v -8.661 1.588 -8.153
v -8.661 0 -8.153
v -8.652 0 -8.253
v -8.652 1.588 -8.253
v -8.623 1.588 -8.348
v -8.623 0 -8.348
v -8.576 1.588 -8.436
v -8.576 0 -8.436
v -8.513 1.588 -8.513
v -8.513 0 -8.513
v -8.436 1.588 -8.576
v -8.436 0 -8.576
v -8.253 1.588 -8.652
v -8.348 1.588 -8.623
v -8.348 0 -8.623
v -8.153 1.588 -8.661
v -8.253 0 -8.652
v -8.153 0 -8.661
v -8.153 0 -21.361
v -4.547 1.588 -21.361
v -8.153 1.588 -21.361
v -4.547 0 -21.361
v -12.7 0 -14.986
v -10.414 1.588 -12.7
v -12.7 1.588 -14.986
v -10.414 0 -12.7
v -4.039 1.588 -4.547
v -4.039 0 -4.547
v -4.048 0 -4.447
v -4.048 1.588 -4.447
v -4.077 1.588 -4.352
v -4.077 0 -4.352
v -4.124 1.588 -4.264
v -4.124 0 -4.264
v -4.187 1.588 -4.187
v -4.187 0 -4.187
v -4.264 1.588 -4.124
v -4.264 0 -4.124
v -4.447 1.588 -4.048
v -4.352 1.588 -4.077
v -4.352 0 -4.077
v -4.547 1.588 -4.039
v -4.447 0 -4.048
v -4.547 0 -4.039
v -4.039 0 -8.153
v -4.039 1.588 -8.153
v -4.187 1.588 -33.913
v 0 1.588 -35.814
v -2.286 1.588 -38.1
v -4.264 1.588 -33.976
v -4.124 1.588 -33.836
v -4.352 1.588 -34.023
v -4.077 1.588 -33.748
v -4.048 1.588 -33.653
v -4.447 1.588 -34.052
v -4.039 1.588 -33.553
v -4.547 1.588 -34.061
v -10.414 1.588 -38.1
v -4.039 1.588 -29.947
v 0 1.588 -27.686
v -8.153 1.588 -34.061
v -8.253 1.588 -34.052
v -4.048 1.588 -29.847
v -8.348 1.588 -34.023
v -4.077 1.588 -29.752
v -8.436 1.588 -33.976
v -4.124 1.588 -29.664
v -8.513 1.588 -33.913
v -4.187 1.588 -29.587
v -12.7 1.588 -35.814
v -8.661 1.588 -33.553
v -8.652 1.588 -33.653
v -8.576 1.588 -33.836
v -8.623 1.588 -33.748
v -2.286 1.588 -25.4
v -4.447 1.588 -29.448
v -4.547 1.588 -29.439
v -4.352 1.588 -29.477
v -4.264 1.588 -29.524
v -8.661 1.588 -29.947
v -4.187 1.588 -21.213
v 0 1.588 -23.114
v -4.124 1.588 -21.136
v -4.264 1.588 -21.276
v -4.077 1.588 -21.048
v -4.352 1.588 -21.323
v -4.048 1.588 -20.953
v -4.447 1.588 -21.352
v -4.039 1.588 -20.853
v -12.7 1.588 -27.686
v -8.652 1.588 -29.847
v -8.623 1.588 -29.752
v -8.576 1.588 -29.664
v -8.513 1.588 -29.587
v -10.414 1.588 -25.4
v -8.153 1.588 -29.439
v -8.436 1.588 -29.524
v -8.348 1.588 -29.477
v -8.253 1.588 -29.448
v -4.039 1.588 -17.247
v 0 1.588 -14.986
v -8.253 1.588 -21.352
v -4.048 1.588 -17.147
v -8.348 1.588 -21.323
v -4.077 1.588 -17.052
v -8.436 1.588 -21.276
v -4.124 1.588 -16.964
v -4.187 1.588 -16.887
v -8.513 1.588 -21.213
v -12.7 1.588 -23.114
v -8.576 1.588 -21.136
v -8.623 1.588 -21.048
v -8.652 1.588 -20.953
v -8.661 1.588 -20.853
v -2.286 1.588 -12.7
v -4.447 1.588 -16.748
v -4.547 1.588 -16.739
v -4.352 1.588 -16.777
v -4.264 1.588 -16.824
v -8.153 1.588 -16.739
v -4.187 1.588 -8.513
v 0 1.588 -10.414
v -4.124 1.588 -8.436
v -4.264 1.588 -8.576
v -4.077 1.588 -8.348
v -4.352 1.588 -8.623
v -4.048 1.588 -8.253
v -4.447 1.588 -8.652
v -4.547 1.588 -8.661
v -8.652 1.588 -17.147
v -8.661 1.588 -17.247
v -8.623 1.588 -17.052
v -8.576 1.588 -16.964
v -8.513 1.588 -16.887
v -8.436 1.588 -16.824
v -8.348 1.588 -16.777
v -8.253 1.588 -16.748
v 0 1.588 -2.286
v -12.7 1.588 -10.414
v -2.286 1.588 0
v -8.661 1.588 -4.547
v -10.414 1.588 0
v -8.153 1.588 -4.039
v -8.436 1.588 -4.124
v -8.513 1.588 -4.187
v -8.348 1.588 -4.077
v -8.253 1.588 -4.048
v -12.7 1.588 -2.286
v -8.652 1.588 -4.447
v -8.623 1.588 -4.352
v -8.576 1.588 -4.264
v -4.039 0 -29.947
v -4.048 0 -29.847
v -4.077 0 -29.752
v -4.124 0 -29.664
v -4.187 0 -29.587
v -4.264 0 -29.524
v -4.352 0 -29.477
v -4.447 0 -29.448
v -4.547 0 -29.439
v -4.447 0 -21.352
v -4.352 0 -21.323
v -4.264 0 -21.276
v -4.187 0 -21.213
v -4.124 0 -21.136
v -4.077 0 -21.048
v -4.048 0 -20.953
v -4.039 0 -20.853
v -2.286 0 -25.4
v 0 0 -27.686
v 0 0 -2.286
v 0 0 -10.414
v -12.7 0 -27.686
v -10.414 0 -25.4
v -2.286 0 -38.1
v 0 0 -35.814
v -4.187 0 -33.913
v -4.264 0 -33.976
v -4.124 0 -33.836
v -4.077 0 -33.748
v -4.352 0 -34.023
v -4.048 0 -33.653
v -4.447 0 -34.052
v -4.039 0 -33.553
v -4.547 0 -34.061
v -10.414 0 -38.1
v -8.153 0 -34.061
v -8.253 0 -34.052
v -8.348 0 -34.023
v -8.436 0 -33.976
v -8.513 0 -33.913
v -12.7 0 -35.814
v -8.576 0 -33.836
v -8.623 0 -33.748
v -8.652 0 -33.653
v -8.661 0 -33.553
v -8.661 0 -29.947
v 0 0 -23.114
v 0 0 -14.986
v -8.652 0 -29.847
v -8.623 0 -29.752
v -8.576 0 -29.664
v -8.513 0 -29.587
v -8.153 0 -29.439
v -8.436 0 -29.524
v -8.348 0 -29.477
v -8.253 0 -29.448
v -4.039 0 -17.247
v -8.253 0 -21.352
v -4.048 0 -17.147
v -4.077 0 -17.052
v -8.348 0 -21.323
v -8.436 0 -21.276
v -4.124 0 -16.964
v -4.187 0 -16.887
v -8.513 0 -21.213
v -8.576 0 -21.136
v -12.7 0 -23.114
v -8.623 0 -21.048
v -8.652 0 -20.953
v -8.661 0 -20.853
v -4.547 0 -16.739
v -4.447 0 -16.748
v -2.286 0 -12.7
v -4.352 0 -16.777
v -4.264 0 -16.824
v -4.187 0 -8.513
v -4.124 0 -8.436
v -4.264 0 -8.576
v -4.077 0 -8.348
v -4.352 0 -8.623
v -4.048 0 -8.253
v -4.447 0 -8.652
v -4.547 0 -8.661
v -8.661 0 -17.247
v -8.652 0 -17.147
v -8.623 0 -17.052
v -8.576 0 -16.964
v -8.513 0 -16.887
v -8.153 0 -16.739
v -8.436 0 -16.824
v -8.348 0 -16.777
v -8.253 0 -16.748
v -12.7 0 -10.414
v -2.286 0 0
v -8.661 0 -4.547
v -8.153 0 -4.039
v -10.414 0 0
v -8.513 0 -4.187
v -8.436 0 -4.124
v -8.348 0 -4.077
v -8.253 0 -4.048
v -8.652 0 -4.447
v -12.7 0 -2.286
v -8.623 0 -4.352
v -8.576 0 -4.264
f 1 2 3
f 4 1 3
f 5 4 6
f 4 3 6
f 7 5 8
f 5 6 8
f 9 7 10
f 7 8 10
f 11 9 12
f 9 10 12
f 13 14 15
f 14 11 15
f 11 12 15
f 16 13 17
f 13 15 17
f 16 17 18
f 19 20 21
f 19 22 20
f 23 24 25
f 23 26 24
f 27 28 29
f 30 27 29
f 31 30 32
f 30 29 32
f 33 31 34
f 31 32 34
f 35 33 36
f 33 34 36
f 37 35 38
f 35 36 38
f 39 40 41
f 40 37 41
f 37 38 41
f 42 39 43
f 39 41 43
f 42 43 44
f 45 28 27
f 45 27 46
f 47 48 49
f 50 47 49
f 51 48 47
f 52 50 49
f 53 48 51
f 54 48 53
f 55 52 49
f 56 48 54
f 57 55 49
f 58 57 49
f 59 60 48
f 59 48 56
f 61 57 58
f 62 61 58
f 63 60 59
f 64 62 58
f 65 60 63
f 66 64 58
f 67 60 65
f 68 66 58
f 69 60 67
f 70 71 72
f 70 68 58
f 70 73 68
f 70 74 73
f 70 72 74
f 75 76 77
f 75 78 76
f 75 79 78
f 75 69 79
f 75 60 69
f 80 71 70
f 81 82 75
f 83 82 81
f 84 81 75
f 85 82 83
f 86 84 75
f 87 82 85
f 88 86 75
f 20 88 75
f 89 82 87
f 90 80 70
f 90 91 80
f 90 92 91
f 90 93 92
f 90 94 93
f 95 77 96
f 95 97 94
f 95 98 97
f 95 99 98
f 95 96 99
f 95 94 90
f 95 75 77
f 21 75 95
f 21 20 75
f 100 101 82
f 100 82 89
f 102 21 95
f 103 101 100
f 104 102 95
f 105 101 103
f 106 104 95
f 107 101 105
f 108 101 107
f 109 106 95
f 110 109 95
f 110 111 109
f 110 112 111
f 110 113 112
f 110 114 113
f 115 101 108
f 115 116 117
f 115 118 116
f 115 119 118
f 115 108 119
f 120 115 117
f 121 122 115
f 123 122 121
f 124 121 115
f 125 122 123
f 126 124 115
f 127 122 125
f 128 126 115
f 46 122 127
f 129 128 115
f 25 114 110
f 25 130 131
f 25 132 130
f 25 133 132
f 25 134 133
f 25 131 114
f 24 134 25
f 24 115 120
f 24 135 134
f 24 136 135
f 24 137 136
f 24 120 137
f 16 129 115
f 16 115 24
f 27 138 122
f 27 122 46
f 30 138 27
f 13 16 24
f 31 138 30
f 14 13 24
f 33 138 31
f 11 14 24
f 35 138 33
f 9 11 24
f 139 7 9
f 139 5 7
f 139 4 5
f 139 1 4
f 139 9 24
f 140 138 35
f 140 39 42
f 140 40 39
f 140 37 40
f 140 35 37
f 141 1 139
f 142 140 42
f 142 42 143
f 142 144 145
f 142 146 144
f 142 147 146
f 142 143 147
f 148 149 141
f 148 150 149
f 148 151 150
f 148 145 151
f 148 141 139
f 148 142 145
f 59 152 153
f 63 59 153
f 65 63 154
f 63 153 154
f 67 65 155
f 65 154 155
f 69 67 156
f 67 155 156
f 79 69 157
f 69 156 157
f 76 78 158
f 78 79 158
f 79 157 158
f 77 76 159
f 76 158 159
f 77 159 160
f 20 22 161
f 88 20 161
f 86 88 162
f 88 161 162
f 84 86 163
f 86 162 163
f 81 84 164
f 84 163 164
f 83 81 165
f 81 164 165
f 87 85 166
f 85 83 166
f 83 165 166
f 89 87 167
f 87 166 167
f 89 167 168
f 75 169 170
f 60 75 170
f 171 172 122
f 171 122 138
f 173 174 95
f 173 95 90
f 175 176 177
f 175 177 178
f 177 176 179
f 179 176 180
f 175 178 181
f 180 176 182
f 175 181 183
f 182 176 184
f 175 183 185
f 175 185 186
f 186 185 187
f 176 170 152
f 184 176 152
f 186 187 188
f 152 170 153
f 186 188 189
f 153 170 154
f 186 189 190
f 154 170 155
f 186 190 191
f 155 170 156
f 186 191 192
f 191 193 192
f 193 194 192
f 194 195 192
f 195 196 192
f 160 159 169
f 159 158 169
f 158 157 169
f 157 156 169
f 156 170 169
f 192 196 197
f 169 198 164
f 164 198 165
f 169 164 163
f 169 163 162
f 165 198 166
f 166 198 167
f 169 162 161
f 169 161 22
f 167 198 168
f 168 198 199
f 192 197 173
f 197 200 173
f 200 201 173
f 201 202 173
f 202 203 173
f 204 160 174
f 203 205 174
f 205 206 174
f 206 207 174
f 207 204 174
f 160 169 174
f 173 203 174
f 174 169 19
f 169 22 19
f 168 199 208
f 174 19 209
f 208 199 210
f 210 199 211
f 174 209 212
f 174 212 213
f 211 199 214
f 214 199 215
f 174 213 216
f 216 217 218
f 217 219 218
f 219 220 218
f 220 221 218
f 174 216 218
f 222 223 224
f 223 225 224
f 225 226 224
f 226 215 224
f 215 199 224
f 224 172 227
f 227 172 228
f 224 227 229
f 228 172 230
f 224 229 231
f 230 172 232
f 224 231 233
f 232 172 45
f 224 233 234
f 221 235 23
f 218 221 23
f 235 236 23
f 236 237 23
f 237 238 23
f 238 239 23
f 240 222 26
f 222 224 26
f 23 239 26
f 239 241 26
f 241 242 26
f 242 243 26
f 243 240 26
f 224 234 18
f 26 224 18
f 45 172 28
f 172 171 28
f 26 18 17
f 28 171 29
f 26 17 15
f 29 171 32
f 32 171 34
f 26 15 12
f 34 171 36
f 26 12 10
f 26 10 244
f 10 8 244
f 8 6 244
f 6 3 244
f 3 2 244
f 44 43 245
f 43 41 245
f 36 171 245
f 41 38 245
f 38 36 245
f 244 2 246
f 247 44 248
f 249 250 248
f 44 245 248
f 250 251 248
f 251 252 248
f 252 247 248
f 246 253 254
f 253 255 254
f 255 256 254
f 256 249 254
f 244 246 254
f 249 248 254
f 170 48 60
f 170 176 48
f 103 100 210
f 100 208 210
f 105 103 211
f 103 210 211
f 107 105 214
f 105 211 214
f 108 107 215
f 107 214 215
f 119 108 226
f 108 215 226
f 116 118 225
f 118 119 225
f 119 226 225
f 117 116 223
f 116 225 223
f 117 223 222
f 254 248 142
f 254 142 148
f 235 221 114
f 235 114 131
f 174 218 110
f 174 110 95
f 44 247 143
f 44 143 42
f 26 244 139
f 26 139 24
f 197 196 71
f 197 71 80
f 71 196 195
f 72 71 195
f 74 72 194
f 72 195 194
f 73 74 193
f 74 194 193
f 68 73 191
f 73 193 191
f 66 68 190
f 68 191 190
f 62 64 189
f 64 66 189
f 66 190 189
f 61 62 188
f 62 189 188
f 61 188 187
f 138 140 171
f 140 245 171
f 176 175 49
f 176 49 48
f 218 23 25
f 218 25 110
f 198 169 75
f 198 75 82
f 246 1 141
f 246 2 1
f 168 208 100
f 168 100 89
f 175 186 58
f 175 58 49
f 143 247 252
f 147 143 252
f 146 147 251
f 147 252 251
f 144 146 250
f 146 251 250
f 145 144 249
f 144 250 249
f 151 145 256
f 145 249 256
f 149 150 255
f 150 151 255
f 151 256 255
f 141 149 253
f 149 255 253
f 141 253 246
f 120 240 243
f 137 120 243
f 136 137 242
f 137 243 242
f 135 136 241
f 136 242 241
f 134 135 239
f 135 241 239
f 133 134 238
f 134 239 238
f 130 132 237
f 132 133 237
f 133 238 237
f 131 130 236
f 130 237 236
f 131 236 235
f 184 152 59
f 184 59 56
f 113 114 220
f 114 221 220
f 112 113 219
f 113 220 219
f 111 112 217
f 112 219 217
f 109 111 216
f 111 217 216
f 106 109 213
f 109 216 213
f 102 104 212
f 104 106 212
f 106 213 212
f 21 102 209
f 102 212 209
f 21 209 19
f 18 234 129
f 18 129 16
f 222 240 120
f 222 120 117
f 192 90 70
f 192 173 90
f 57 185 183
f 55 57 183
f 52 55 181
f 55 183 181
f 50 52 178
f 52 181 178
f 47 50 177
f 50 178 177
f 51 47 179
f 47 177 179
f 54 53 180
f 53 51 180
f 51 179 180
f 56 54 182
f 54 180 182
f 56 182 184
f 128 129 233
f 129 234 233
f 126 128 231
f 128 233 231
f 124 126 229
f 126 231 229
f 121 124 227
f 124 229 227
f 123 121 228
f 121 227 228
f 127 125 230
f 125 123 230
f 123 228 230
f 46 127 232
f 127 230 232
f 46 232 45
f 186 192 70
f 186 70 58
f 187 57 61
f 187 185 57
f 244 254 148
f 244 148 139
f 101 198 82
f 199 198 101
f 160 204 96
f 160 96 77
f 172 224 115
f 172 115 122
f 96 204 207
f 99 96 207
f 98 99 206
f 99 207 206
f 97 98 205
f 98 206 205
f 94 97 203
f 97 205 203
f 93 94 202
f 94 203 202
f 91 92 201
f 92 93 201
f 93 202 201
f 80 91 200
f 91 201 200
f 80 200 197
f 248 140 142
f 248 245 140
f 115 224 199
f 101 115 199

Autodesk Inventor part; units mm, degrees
ref_plane "YZ Plane" through (0, 0, 0) normal (1, 0, 0) x (0, 1, 0)
ref_plane "XZ Plane" through (0, 0, 0) normal (0, 1, 0) x (-1, 0, 0)
ref_plane "XY Plane" through (0, 0, 0) normal (0, 0, 1) x (1, 0, 0)
sketch "Sketch1" plane through (0, 0, 0) normal (0, 1, 0) x (-1, 0, 0)
  line L0 (2.286, 0) -> (10.414, 0)
  line L1 (12.7, -2.286) -> (12.7, -10.414)
  line L2 (10.414, -12.7) -> (2.286, -12.7)
  line L3 (0, -10.414) -> (0, -2.286)
  line L4 (8.1534, -4.0386) -> (4.5466, -4.0386)
  line L5 (4.0386, -4.5466) -> (4.0386, -8.1534)
  line L6 (4.5466, -8.6614) -> (8.1534, -8.6614)
  line L7 (8.6614, -8.1534) -> (8.6614, -4.5466)
  line L8 (10.414, 0) -> (12.7, -2.286)
  line L9 (12.7, -10.414) -> (10.414, -12.7)
  line L10 (2.286, -12.7) -> (0, -10.414)
  line L11 (2.286, 0) -> (0, -2.286)
  arc A0 (8.6614, -4.5466) -> (8.1534, -4.0386) centre (8.1534, -4.5466) ccw
  arc A1 (8.1534, -8.6614) -> (8.6614, -8.1534) centre (8.1534, -8.1534) ccw
  arc A2 (4.0386, -8.1534) -> (4.5466, -8.6614) centre (4.5466, -8.1534) ccw
  arc A3 (4.5466, -4.0386) -> (4.0386, -4.5466) centre (4.5466, -4.5466) ccw
  line L12 (8.1534, -4.5466) -> (4.5466, -8.1534) construction
  line L13 (12.7, -10.414) -> (0, -2.286) construction
  point P0 (0, 0)
  point P1 (12.7, -12.7)
  point P2 (12.7, 0)
  point P3 (0, -12.7)
  point P4 (4.0386, -8.6614)
  point P5 (8.6614, -8.6614)
  point P6 (6.35, -6.35)
  dimension "d1" = 12.7
  dimension "d2" = 4.6228
  dimension "d3" = 2.286
  dimension "d4" = 2.286
  dimension "d5" = 2.286
  dimension "d6" = 2.286
  dimension "d7" = 2.286
  dimension "d8" = 2.286
  dimension "d9" = 2.286
  dimension "d10" = 2.286
  dimension "d11" = 0.508
extrude "Body" add sketch "Sketch1" along normal blind 1.5875
sketch "Sketch2" plane through (0, 1.5875, 0) normal (0, 1, 0) x (1, 0, 0)
  arc A0 (-8.1534, 8.6614) -> (-8.6614, 8.1534) centre (-8.1534, 8.1534) ccw construction
  arc A1 (-4.5466, 4.0386) -> (-4.0386, 4.5466) centre (-4.5466, 4.5466) ccw construction
  circle A2 centre (-6.35, 6.35) radius 2.1844
  line L0 (-8.1534, 8.1534) -> (-4.5466, 4.5466) construction
  point P0 (0, 0)
  dimension "d14" = 4.3688
surface extrude "Circle" sketch "Sketch2" against normal up to surface (1.5875 mm away) shown yes curves A2
pattern_linear "Rectangular Pattern1" count 3 spacing 12.7 along (0, 0, -1) of "Body", "Circle"
equation "\"d4\" = d3"
equation "\"d5\" = d3"
equation "\"d6\" = d5"
equation "\"d7\" = d3"
equation "\"d8\" = d7"
equation "\"d9\" = d3"
equation "\"d10\" = d9"
equation "\"d22\" = d19"
equation "\"d19\" = 12.7"
